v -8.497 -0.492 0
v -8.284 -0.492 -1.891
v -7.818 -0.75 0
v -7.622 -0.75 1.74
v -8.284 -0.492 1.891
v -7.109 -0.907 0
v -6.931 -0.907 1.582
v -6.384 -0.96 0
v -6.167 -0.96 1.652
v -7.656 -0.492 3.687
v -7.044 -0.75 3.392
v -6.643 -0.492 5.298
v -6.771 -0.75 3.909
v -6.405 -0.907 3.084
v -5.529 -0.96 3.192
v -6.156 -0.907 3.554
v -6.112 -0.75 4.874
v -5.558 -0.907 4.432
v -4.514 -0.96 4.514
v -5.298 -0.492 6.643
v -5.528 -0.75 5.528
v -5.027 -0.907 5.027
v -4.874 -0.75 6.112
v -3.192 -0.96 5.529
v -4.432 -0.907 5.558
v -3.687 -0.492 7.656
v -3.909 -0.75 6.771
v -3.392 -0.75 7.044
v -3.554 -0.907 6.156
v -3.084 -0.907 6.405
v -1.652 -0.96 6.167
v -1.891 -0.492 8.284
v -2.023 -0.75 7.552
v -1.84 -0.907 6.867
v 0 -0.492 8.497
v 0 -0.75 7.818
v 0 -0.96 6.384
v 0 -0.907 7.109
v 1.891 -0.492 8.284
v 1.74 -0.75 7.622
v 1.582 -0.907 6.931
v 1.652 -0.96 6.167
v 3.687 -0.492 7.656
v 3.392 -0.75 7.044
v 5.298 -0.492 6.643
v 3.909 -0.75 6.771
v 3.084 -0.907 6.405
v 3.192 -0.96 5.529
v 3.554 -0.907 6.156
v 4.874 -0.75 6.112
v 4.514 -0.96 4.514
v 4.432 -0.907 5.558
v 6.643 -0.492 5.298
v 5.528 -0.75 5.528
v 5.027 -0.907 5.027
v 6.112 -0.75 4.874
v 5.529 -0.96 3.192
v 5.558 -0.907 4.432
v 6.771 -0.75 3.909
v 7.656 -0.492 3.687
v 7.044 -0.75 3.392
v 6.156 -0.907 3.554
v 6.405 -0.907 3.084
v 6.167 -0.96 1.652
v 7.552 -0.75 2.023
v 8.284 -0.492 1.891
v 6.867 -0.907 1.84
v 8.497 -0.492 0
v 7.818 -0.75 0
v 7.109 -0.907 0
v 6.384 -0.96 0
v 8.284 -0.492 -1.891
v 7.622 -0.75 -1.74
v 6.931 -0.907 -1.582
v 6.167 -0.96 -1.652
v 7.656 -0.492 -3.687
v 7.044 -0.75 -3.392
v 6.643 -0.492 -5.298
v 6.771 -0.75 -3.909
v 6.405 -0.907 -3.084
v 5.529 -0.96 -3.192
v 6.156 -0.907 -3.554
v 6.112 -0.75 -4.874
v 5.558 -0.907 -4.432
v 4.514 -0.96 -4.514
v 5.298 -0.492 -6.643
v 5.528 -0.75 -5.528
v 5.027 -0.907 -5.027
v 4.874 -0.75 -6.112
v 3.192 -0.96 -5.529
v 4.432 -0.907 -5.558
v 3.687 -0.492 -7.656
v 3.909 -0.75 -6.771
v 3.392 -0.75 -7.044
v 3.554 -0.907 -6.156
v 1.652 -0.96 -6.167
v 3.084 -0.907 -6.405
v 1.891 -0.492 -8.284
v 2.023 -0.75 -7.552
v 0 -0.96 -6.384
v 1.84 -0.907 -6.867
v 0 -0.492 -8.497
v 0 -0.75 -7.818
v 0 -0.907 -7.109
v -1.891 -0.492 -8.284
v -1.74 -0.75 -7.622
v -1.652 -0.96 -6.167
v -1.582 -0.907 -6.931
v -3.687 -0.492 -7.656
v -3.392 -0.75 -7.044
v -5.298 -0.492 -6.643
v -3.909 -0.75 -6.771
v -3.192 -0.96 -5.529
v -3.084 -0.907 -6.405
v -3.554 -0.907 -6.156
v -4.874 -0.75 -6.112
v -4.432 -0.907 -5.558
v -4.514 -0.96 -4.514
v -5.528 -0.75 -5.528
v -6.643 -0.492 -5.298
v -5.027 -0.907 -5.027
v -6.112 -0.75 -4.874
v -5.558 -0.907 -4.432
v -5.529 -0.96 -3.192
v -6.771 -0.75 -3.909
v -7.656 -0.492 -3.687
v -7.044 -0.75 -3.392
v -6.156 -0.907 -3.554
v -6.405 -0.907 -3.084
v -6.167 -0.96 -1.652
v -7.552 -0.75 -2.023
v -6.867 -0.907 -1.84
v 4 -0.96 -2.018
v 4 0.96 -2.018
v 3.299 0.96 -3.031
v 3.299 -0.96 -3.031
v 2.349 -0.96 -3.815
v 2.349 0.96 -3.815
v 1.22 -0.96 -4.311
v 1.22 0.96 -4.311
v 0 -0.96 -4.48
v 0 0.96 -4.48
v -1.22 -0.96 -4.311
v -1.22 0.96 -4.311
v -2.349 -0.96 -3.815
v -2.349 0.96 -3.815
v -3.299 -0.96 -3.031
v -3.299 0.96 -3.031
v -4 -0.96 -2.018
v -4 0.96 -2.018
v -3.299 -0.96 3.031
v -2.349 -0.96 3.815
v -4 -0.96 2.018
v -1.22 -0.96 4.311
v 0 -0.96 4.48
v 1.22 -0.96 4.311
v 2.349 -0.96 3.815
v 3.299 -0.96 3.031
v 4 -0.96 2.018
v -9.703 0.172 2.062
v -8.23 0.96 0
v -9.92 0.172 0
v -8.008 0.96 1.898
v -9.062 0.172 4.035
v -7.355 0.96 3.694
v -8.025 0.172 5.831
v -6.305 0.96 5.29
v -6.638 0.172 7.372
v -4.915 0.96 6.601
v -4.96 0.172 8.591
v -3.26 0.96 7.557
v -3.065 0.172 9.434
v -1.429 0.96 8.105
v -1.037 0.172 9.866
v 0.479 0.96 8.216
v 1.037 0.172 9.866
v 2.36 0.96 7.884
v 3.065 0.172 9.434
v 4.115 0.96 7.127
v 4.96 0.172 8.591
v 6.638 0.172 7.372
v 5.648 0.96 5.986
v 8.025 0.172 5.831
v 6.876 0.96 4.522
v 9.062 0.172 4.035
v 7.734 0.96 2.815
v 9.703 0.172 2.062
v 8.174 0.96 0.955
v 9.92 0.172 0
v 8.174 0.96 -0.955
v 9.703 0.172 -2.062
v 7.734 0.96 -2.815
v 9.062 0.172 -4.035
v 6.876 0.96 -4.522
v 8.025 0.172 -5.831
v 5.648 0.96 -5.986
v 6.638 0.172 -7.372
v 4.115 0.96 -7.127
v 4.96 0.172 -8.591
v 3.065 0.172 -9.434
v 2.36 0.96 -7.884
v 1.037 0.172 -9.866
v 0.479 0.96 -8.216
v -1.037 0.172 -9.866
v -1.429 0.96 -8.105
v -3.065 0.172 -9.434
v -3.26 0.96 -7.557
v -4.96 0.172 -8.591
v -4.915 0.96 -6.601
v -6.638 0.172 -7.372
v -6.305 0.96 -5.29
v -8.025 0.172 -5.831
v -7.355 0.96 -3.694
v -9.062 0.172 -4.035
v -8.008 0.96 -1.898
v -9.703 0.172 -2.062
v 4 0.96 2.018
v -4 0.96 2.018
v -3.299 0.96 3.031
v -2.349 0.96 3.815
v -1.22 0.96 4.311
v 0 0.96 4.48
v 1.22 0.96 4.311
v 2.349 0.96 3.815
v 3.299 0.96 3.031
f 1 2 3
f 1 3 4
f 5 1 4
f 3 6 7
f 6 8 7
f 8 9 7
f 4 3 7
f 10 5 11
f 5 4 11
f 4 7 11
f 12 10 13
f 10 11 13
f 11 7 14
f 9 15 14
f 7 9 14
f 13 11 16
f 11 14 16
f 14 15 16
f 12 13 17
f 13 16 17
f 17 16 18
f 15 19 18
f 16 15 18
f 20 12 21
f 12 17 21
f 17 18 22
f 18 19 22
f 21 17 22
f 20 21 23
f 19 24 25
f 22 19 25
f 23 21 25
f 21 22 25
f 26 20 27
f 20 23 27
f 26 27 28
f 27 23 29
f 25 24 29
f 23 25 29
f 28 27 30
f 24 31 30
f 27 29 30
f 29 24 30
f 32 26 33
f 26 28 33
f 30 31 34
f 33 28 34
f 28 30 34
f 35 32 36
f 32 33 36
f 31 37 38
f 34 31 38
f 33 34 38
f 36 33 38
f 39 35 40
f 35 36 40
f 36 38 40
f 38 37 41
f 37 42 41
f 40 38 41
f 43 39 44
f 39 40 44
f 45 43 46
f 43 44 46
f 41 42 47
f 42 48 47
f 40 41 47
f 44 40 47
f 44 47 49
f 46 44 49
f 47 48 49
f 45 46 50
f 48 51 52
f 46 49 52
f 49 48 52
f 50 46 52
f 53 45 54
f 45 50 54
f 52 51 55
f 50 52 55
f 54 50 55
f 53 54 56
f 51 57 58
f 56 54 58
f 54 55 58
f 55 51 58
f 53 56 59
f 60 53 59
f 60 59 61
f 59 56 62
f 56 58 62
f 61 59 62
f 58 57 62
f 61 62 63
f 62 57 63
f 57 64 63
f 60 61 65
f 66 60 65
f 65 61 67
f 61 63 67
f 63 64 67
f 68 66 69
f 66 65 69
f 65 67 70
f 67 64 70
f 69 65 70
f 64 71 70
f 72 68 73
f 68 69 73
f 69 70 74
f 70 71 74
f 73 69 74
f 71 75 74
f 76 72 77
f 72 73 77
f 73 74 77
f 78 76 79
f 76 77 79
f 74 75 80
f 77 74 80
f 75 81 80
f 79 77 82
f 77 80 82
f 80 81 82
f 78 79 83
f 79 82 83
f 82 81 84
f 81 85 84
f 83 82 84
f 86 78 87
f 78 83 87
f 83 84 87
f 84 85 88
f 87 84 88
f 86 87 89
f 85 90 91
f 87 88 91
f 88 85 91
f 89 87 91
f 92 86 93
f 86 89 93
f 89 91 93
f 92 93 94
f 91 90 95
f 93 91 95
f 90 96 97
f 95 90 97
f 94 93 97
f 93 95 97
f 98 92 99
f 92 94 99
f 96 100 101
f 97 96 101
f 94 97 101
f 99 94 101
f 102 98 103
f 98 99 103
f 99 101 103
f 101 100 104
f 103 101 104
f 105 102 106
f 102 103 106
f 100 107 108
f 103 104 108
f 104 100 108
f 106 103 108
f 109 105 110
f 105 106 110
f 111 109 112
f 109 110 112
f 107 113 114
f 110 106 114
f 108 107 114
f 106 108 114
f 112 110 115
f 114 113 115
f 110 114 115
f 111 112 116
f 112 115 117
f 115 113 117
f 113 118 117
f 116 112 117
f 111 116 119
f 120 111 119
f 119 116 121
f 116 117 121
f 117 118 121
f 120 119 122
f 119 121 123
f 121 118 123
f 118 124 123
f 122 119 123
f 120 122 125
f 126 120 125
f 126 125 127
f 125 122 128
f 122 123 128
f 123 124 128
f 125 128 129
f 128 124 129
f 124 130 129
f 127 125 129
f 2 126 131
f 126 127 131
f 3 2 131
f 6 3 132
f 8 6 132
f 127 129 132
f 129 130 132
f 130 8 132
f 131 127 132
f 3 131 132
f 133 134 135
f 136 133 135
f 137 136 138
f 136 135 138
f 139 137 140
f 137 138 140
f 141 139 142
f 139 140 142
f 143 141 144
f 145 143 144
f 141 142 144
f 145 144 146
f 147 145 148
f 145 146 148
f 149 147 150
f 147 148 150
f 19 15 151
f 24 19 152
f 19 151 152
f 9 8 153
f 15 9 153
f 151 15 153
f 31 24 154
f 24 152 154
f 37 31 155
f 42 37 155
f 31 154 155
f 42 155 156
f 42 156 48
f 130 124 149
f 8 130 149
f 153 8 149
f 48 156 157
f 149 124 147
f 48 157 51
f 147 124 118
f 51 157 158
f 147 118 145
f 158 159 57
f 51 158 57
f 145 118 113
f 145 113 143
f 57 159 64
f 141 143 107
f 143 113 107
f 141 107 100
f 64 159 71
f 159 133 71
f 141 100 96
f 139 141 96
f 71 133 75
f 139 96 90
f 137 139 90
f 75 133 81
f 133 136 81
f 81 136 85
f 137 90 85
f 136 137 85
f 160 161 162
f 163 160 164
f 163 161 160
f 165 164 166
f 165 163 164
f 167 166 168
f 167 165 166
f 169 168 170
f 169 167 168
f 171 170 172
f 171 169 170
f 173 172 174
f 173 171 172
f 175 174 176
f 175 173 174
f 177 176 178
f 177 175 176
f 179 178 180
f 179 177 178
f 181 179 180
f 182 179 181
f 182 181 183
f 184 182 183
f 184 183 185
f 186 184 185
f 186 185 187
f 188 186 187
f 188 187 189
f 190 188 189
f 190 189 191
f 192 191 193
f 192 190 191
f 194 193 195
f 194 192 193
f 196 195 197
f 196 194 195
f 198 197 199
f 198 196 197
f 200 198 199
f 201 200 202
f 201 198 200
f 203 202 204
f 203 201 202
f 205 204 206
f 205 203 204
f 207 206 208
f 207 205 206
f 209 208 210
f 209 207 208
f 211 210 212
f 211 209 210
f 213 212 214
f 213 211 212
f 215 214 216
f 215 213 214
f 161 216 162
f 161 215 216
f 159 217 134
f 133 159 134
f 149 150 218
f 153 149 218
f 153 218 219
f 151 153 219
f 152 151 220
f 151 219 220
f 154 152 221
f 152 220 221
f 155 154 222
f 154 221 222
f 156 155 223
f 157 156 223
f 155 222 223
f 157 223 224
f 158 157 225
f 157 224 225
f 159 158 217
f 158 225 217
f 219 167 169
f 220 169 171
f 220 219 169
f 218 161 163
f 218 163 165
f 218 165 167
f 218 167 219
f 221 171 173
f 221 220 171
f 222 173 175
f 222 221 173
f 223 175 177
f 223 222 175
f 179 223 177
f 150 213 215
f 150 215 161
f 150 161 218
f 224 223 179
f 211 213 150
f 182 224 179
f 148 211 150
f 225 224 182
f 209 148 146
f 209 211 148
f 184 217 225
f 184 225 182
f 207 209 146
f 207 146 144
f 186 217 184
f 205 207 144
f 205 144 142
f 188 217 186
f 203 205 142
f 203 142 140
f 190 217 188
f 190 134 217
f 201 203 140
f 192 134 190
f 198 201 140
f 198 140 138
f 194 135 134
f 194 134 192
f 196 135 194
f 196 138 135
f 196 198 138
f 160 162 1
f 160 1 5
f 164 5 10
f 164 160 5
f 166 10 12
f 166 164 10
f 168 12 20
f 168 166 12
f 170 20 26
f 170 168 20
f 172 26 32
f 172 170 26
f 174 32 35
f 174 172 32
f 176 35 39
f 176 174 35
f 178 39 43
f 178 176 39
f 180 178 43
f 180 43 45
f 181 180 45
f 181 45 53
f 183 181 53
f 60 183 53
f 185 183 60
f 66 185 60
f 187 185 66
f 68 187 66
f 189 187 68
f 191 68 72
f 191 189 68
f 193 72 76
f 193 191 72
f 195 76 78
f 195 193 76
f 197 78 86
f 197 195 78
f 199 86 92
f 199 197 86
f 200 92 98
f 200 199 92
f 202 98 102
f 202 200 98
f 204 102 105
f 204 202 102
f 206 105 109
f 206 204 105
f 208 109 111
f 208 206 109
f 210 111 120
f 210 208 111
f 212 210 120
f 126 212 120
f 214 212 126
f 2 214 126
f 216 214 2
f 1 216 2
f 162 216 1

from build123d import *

# Parameters (mm, degrees)
SKETCH2_R           = 9.92
BOSS_EXTRUDE1_DEPTH = 0.96
CUT_EXTRUDE2_DEPTH  = 1.92
FILLET1_R           = 5


with BuildPart() as part:
    # Sketch2 → Boss-Extrude1 (new body, symmetric)
    with BuildSketch(Plane(origin=(0, 0, 0), x_dir=(1, 0, 0), z_dir=(0, 1, 0))):
        Circle(SKETCH2_R)
    extrude(amount=BOSS_EXTRUDE1_DEPTH, both=True)

    # Sketch3 → Cut-Revolve3 (revolve, cut)
    with BuildSketch(Plane.XY):
        Polygon((-9.92, 0.96), (-9.92, 0.171940058), (-8.23, 0.96), align=None)
        Polygon((-7.492546713, -0.96), (-9.92, 0.171940058), (-9.92, -0.96), align=None)
    revolve(axis=Axis((0, 0, 0), (0, 1, 0)), mode=Mode.SUBTRACT)

    # Sketch4 → Cut-Extrude2 (cut)
    with BuildSketch(Plane(origin=(0, 0.96, 0), x_dir=(1, 0, 0), z_dir=(0, 1, 0))):
        with BuildLine():
            Line((4, 0), (4, 2.017523234))
            ThreePointArc((4, 2.017523234), (0, 4.48), (-4, 2.017523234))
            Line((-4, 2.017523234), (-4, 0))
            Line((-4, 0), (-4, -2.017523234))
            ThreePointArc((-4, -2.017523234), (0, -4.48), (4, -2.017523234))
            Line((4, -2.017523234), (4, 0))
        make_face()
    extrude(amount=-CUT_EXTRUDE2_DEPTH, mode=Mode.SUBTRACT)

    # Fillet1
    fillet1_edges = [part.edges().sort_by_distance(p)[0] for p in [
        (7.492546713, -0.96, 0),
    ]]
    fillet(fillet1_edges, radius=FILLET1_R)


solid = part.part
